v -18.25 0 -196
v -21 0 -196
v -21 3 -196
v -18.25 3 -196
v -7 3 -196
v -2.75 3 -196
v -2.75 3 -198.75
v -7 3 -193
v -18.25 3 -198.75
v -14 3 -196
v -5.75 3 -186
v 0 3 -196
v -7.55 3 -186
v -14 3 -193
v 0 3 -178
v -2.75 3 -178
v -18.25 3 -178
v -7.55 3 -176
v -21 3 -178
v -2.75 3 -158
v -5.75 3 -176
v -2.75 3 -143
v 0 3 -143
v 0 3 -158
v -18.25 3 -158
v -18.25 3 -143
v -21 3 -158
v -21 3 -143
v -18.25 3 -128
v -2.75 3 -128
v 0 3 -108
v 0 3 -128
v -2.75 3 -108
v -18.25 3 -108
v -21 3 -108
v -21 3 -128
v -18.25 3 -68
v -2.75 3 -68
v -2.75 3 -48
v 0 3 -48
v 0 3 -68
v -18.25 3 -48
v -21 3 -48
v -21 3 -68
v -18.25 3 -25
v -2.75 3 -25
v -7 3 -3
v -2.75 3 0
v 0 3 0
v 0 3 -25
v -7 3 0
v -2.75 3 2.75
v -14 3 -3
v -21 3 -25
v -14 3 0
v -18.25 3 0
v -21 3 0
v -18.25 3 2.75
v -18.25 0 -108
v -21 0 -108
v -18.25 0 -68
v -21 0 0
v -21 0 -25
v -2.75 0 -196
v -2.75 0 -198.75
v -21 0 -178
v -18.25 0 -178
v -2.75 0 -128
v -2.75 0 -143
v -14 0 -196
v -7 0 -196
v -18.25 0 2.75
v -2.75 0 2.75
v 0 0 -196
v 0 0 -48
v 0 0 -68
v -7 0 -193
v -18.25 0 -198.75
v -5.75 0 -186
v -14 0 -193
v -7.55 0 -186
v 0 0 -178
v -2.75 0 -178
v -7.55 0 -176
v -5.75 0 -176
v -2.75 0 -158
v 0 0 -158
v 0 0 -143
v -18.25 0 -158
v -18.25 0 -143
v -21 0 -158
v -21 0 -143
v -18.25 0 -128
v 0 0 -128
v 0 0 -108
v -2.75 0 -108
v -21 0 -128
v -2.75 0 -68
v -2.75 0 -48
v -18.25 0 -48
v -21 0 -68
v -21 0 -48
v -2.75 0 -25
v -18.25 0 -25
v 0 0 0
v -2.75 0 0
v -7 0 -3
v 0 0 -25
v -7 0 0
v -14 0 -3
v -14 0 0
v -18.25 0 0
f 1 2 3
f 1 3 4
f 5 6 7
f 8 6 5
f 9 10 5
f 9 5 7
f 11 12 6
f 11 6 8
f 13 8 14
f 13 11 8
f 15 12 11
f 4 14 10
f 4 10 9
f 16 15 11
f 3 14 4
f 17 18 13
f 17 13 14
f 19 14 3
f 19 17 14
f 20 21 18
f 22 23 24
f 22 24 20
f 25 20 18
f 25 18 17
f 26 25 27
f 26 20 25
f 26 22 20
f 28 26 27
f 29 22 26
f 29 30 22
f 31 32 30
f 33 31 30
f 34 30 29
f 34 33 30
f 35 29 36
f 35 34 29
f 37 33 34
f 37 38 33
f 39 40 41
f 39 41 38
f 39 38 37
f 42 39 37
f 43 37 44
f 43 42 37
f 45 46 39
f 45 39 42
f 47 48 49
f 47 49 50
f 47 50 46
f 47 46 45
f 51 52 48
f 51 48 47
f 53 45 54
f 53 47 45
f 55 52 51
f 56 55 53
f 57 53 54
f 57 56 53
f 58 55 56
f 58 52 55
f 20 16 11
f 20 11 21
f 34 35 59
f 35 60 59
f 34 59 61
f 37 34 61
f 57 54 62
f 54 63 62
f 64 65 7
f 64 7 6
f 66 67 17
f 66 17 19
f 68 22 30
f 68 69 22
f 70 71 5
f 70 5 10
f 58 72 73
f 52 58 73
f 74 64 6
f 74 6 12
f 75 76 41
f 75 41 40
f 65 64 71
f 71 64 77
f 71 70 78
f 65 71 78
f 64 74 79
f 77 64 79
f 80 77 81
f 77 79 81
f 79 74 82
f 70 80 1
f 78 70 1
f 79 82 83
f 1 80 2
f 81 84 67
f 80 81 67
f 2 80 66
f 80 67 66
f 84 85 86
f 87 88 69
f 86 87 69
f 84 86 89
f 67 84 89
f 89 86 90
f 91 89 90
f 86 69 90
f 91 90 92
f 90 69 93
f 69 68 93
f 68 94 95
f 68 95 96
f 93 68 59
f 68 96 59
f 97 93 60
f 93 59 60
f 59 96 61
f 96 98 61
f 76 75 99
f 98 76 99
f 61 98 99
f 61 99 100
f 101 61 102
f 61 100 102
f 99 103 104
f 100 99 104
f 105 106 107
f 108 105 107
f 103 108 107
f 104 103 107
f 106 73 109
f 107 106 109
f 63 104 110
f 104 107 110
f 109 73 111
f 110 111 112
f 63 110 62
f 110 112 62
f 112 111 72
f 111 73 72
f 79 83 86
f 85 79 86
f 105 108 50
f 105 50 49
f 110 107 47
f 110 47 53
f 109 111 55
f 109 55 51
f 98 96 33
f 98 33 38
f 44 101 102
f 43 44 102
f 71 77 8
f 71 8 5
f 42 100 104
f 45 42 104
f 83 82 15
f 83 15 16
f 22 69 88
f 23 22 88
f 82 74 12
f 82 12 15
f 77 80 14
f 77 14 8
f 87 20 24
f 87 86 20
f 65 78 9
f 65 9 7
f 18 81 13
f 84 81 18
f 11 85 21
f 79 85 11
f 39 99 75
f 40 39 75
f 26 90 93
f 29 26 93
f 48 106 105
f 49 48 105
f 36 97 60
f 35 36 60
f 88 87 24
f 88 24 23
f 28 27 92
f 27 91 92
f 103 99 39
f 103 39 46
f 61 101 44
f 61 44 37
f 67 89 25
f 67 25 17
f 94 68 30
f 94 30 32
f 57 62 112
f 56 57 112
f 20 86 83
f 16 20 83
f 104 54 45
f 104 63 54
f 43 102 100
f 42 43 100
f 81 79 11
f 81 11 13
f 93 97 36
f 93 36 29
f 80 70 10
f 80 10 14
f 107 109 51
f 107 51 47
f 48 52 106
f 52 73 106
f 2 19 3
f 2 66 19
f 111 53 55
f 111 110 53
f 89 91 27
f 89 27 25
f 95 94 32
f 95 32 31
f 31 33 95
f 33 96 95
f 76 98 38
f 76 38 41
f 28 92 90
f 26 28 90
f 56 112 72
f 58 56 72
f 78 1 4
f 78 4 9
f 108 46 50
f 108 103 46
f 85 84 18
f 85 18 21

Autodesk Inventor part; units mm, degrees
ref_plane "YZ Plane" through (0, 0, 0) normal (1, 0, 0) x (0, 1, 0)
ref_plane "XZ Plane" through (0, 0, 0) normal (0, 1, 0) x (-1, 0, 0)
ref_plane "XY Plane" through (0, 0, 0) normal (0, 0, 1) x (1, 0, 0)
sketch "Sketch1" plane through (0, 0, 0) normal (0, 1, 0) x (-1, 0, 0)
  line L0 (21, -25) -> (18.25, -25)
  line L1 (21, -48) -> (18.25, -48)
  line L2 (21, -143) -> (18.25, -143)
  line L3 (21, -68) -> (18.25, -68)
  line L4 (21, -128) -> (18.25, -128)
  line L5 (21, -108) -> (18.25, -108)
  line L6 (2.75, -68) -> (0, -68)
  line L7 (2.75, -108) -> (0, -108)
  line L8 (2.75, -128) -> (0, -128)
  line L9 (2.75, -143) -> (0, -143)
  line L10 (2.75, -48) -> (0, -48)
  line L11 (2.75, -25) -> (0, -25)
  line L12 (21, -158) -> (21, -143)
  line L13 (21, -128) -> (21, -108)
  line L14 (21, -68) -> (21, -48)
  line L15 (21, -25) -> (21, 0)
  line L16 (0, -158) -> (0, -143)
  line L17 (0, -128) -> (0, -108)
  line L18 (0, -68) -> (0, -48)
  line L19 (0, -25) -> (0, 0)
  line L20 (18.25, -143) -> (18.25, -128)
  line L21 (18.25, -108) -> (18.25, -68)
  line L22 (18.25, -48) -> (18.25, -25)
  line L23 (2.75, -143) -> (2.75, -128)
  line L24 (2.75, -108) -> (2.75, -68)
  line L25 (2.75, -48) -> (2.75, -25)
  line L26 (21, -68) -> (21, -48) construction
  line L27 (10.5, -68) -> (10.5, -97) construction
  line L28 (18.25, -158) -> (18.25, -178)
  line L29 (18.25, -178) -> (21, -178)
  line L30 (21, -178) -> (21, -196)
  line L31 (0, -196) -> (0, -178)
  line L32 (0, -178) -> (2.75, -178)
  line L33 (2.75, -158) -> (2.75, -178)
  line L34 (21, -158) -> (18.25, -158)
  line L35 (2.75, -158) -> (0, -158)
  line L36 (7.55, -176) -> (5.75, -176)
  line L37 (5.75, -176) -> (5.75, -186)
  line L38 (5.75, -186) -> (7.55, -186)
  line L39 (7.55, -186) -> (7.55, -176)
  line L40 (18.25, 0) -> (18.25, 2.75)
  line L41 (18.25, 2.75) -> (2.75, 2.75)
  line L42 (2.75, 2.75) -> (2.75, 0)
  line L43 (21, 0) -> (18.25, 0)
  line L44 (2.75, 0) -> (0, 0)
  line L45 (18.25, -196) -> (18.25, -198.75)
  line L46 (18.25, -198.75) -> (2.75, -198.75)
  line L47 (2.75, -198.75) -> (2.75, -196)
  line L48 (21, -196) -> (18.25, -196)
  line L49 (2.75, -196) -> (0, -196)
  line L50 (14, 0) -> (7, 0)
  line L51 (7, 0) -> (7, -3)
  line L52 (7, -3) -> (14, -3)
  line L53 (14, -3) -> (14, 0)
  line L54 (14, -193) -> (7, -193)
  line L55 (7, -193) -> (7, -196)
  line L56 (7, -196) -> (14, -196)
  line L57 (14, -196) -> (14, -193)
  dimension "d7" = 23
  dimension "d8" = 20
  dimension "d9" = 40
  dimension "d10" = 20
  dimension "d11" = 15
  dimension "d28" = 15.5
  dimension "d31" = 2.75
  dimension "d44" = 18
  dimension "d45" = 20
  dimension "d47" = 15
  dimension "d49" = 1.8
  dimension "d51" = 10
  dimension "d53" = 3
  dimension "d55" = 25
  dimension "d56" = 10
  dimension "d57" = 7
  dimension "d58" = 3
extrude "Extrusion3" add sketch "Sketch1" along normal blind 3
properties part number "Right_wall"
